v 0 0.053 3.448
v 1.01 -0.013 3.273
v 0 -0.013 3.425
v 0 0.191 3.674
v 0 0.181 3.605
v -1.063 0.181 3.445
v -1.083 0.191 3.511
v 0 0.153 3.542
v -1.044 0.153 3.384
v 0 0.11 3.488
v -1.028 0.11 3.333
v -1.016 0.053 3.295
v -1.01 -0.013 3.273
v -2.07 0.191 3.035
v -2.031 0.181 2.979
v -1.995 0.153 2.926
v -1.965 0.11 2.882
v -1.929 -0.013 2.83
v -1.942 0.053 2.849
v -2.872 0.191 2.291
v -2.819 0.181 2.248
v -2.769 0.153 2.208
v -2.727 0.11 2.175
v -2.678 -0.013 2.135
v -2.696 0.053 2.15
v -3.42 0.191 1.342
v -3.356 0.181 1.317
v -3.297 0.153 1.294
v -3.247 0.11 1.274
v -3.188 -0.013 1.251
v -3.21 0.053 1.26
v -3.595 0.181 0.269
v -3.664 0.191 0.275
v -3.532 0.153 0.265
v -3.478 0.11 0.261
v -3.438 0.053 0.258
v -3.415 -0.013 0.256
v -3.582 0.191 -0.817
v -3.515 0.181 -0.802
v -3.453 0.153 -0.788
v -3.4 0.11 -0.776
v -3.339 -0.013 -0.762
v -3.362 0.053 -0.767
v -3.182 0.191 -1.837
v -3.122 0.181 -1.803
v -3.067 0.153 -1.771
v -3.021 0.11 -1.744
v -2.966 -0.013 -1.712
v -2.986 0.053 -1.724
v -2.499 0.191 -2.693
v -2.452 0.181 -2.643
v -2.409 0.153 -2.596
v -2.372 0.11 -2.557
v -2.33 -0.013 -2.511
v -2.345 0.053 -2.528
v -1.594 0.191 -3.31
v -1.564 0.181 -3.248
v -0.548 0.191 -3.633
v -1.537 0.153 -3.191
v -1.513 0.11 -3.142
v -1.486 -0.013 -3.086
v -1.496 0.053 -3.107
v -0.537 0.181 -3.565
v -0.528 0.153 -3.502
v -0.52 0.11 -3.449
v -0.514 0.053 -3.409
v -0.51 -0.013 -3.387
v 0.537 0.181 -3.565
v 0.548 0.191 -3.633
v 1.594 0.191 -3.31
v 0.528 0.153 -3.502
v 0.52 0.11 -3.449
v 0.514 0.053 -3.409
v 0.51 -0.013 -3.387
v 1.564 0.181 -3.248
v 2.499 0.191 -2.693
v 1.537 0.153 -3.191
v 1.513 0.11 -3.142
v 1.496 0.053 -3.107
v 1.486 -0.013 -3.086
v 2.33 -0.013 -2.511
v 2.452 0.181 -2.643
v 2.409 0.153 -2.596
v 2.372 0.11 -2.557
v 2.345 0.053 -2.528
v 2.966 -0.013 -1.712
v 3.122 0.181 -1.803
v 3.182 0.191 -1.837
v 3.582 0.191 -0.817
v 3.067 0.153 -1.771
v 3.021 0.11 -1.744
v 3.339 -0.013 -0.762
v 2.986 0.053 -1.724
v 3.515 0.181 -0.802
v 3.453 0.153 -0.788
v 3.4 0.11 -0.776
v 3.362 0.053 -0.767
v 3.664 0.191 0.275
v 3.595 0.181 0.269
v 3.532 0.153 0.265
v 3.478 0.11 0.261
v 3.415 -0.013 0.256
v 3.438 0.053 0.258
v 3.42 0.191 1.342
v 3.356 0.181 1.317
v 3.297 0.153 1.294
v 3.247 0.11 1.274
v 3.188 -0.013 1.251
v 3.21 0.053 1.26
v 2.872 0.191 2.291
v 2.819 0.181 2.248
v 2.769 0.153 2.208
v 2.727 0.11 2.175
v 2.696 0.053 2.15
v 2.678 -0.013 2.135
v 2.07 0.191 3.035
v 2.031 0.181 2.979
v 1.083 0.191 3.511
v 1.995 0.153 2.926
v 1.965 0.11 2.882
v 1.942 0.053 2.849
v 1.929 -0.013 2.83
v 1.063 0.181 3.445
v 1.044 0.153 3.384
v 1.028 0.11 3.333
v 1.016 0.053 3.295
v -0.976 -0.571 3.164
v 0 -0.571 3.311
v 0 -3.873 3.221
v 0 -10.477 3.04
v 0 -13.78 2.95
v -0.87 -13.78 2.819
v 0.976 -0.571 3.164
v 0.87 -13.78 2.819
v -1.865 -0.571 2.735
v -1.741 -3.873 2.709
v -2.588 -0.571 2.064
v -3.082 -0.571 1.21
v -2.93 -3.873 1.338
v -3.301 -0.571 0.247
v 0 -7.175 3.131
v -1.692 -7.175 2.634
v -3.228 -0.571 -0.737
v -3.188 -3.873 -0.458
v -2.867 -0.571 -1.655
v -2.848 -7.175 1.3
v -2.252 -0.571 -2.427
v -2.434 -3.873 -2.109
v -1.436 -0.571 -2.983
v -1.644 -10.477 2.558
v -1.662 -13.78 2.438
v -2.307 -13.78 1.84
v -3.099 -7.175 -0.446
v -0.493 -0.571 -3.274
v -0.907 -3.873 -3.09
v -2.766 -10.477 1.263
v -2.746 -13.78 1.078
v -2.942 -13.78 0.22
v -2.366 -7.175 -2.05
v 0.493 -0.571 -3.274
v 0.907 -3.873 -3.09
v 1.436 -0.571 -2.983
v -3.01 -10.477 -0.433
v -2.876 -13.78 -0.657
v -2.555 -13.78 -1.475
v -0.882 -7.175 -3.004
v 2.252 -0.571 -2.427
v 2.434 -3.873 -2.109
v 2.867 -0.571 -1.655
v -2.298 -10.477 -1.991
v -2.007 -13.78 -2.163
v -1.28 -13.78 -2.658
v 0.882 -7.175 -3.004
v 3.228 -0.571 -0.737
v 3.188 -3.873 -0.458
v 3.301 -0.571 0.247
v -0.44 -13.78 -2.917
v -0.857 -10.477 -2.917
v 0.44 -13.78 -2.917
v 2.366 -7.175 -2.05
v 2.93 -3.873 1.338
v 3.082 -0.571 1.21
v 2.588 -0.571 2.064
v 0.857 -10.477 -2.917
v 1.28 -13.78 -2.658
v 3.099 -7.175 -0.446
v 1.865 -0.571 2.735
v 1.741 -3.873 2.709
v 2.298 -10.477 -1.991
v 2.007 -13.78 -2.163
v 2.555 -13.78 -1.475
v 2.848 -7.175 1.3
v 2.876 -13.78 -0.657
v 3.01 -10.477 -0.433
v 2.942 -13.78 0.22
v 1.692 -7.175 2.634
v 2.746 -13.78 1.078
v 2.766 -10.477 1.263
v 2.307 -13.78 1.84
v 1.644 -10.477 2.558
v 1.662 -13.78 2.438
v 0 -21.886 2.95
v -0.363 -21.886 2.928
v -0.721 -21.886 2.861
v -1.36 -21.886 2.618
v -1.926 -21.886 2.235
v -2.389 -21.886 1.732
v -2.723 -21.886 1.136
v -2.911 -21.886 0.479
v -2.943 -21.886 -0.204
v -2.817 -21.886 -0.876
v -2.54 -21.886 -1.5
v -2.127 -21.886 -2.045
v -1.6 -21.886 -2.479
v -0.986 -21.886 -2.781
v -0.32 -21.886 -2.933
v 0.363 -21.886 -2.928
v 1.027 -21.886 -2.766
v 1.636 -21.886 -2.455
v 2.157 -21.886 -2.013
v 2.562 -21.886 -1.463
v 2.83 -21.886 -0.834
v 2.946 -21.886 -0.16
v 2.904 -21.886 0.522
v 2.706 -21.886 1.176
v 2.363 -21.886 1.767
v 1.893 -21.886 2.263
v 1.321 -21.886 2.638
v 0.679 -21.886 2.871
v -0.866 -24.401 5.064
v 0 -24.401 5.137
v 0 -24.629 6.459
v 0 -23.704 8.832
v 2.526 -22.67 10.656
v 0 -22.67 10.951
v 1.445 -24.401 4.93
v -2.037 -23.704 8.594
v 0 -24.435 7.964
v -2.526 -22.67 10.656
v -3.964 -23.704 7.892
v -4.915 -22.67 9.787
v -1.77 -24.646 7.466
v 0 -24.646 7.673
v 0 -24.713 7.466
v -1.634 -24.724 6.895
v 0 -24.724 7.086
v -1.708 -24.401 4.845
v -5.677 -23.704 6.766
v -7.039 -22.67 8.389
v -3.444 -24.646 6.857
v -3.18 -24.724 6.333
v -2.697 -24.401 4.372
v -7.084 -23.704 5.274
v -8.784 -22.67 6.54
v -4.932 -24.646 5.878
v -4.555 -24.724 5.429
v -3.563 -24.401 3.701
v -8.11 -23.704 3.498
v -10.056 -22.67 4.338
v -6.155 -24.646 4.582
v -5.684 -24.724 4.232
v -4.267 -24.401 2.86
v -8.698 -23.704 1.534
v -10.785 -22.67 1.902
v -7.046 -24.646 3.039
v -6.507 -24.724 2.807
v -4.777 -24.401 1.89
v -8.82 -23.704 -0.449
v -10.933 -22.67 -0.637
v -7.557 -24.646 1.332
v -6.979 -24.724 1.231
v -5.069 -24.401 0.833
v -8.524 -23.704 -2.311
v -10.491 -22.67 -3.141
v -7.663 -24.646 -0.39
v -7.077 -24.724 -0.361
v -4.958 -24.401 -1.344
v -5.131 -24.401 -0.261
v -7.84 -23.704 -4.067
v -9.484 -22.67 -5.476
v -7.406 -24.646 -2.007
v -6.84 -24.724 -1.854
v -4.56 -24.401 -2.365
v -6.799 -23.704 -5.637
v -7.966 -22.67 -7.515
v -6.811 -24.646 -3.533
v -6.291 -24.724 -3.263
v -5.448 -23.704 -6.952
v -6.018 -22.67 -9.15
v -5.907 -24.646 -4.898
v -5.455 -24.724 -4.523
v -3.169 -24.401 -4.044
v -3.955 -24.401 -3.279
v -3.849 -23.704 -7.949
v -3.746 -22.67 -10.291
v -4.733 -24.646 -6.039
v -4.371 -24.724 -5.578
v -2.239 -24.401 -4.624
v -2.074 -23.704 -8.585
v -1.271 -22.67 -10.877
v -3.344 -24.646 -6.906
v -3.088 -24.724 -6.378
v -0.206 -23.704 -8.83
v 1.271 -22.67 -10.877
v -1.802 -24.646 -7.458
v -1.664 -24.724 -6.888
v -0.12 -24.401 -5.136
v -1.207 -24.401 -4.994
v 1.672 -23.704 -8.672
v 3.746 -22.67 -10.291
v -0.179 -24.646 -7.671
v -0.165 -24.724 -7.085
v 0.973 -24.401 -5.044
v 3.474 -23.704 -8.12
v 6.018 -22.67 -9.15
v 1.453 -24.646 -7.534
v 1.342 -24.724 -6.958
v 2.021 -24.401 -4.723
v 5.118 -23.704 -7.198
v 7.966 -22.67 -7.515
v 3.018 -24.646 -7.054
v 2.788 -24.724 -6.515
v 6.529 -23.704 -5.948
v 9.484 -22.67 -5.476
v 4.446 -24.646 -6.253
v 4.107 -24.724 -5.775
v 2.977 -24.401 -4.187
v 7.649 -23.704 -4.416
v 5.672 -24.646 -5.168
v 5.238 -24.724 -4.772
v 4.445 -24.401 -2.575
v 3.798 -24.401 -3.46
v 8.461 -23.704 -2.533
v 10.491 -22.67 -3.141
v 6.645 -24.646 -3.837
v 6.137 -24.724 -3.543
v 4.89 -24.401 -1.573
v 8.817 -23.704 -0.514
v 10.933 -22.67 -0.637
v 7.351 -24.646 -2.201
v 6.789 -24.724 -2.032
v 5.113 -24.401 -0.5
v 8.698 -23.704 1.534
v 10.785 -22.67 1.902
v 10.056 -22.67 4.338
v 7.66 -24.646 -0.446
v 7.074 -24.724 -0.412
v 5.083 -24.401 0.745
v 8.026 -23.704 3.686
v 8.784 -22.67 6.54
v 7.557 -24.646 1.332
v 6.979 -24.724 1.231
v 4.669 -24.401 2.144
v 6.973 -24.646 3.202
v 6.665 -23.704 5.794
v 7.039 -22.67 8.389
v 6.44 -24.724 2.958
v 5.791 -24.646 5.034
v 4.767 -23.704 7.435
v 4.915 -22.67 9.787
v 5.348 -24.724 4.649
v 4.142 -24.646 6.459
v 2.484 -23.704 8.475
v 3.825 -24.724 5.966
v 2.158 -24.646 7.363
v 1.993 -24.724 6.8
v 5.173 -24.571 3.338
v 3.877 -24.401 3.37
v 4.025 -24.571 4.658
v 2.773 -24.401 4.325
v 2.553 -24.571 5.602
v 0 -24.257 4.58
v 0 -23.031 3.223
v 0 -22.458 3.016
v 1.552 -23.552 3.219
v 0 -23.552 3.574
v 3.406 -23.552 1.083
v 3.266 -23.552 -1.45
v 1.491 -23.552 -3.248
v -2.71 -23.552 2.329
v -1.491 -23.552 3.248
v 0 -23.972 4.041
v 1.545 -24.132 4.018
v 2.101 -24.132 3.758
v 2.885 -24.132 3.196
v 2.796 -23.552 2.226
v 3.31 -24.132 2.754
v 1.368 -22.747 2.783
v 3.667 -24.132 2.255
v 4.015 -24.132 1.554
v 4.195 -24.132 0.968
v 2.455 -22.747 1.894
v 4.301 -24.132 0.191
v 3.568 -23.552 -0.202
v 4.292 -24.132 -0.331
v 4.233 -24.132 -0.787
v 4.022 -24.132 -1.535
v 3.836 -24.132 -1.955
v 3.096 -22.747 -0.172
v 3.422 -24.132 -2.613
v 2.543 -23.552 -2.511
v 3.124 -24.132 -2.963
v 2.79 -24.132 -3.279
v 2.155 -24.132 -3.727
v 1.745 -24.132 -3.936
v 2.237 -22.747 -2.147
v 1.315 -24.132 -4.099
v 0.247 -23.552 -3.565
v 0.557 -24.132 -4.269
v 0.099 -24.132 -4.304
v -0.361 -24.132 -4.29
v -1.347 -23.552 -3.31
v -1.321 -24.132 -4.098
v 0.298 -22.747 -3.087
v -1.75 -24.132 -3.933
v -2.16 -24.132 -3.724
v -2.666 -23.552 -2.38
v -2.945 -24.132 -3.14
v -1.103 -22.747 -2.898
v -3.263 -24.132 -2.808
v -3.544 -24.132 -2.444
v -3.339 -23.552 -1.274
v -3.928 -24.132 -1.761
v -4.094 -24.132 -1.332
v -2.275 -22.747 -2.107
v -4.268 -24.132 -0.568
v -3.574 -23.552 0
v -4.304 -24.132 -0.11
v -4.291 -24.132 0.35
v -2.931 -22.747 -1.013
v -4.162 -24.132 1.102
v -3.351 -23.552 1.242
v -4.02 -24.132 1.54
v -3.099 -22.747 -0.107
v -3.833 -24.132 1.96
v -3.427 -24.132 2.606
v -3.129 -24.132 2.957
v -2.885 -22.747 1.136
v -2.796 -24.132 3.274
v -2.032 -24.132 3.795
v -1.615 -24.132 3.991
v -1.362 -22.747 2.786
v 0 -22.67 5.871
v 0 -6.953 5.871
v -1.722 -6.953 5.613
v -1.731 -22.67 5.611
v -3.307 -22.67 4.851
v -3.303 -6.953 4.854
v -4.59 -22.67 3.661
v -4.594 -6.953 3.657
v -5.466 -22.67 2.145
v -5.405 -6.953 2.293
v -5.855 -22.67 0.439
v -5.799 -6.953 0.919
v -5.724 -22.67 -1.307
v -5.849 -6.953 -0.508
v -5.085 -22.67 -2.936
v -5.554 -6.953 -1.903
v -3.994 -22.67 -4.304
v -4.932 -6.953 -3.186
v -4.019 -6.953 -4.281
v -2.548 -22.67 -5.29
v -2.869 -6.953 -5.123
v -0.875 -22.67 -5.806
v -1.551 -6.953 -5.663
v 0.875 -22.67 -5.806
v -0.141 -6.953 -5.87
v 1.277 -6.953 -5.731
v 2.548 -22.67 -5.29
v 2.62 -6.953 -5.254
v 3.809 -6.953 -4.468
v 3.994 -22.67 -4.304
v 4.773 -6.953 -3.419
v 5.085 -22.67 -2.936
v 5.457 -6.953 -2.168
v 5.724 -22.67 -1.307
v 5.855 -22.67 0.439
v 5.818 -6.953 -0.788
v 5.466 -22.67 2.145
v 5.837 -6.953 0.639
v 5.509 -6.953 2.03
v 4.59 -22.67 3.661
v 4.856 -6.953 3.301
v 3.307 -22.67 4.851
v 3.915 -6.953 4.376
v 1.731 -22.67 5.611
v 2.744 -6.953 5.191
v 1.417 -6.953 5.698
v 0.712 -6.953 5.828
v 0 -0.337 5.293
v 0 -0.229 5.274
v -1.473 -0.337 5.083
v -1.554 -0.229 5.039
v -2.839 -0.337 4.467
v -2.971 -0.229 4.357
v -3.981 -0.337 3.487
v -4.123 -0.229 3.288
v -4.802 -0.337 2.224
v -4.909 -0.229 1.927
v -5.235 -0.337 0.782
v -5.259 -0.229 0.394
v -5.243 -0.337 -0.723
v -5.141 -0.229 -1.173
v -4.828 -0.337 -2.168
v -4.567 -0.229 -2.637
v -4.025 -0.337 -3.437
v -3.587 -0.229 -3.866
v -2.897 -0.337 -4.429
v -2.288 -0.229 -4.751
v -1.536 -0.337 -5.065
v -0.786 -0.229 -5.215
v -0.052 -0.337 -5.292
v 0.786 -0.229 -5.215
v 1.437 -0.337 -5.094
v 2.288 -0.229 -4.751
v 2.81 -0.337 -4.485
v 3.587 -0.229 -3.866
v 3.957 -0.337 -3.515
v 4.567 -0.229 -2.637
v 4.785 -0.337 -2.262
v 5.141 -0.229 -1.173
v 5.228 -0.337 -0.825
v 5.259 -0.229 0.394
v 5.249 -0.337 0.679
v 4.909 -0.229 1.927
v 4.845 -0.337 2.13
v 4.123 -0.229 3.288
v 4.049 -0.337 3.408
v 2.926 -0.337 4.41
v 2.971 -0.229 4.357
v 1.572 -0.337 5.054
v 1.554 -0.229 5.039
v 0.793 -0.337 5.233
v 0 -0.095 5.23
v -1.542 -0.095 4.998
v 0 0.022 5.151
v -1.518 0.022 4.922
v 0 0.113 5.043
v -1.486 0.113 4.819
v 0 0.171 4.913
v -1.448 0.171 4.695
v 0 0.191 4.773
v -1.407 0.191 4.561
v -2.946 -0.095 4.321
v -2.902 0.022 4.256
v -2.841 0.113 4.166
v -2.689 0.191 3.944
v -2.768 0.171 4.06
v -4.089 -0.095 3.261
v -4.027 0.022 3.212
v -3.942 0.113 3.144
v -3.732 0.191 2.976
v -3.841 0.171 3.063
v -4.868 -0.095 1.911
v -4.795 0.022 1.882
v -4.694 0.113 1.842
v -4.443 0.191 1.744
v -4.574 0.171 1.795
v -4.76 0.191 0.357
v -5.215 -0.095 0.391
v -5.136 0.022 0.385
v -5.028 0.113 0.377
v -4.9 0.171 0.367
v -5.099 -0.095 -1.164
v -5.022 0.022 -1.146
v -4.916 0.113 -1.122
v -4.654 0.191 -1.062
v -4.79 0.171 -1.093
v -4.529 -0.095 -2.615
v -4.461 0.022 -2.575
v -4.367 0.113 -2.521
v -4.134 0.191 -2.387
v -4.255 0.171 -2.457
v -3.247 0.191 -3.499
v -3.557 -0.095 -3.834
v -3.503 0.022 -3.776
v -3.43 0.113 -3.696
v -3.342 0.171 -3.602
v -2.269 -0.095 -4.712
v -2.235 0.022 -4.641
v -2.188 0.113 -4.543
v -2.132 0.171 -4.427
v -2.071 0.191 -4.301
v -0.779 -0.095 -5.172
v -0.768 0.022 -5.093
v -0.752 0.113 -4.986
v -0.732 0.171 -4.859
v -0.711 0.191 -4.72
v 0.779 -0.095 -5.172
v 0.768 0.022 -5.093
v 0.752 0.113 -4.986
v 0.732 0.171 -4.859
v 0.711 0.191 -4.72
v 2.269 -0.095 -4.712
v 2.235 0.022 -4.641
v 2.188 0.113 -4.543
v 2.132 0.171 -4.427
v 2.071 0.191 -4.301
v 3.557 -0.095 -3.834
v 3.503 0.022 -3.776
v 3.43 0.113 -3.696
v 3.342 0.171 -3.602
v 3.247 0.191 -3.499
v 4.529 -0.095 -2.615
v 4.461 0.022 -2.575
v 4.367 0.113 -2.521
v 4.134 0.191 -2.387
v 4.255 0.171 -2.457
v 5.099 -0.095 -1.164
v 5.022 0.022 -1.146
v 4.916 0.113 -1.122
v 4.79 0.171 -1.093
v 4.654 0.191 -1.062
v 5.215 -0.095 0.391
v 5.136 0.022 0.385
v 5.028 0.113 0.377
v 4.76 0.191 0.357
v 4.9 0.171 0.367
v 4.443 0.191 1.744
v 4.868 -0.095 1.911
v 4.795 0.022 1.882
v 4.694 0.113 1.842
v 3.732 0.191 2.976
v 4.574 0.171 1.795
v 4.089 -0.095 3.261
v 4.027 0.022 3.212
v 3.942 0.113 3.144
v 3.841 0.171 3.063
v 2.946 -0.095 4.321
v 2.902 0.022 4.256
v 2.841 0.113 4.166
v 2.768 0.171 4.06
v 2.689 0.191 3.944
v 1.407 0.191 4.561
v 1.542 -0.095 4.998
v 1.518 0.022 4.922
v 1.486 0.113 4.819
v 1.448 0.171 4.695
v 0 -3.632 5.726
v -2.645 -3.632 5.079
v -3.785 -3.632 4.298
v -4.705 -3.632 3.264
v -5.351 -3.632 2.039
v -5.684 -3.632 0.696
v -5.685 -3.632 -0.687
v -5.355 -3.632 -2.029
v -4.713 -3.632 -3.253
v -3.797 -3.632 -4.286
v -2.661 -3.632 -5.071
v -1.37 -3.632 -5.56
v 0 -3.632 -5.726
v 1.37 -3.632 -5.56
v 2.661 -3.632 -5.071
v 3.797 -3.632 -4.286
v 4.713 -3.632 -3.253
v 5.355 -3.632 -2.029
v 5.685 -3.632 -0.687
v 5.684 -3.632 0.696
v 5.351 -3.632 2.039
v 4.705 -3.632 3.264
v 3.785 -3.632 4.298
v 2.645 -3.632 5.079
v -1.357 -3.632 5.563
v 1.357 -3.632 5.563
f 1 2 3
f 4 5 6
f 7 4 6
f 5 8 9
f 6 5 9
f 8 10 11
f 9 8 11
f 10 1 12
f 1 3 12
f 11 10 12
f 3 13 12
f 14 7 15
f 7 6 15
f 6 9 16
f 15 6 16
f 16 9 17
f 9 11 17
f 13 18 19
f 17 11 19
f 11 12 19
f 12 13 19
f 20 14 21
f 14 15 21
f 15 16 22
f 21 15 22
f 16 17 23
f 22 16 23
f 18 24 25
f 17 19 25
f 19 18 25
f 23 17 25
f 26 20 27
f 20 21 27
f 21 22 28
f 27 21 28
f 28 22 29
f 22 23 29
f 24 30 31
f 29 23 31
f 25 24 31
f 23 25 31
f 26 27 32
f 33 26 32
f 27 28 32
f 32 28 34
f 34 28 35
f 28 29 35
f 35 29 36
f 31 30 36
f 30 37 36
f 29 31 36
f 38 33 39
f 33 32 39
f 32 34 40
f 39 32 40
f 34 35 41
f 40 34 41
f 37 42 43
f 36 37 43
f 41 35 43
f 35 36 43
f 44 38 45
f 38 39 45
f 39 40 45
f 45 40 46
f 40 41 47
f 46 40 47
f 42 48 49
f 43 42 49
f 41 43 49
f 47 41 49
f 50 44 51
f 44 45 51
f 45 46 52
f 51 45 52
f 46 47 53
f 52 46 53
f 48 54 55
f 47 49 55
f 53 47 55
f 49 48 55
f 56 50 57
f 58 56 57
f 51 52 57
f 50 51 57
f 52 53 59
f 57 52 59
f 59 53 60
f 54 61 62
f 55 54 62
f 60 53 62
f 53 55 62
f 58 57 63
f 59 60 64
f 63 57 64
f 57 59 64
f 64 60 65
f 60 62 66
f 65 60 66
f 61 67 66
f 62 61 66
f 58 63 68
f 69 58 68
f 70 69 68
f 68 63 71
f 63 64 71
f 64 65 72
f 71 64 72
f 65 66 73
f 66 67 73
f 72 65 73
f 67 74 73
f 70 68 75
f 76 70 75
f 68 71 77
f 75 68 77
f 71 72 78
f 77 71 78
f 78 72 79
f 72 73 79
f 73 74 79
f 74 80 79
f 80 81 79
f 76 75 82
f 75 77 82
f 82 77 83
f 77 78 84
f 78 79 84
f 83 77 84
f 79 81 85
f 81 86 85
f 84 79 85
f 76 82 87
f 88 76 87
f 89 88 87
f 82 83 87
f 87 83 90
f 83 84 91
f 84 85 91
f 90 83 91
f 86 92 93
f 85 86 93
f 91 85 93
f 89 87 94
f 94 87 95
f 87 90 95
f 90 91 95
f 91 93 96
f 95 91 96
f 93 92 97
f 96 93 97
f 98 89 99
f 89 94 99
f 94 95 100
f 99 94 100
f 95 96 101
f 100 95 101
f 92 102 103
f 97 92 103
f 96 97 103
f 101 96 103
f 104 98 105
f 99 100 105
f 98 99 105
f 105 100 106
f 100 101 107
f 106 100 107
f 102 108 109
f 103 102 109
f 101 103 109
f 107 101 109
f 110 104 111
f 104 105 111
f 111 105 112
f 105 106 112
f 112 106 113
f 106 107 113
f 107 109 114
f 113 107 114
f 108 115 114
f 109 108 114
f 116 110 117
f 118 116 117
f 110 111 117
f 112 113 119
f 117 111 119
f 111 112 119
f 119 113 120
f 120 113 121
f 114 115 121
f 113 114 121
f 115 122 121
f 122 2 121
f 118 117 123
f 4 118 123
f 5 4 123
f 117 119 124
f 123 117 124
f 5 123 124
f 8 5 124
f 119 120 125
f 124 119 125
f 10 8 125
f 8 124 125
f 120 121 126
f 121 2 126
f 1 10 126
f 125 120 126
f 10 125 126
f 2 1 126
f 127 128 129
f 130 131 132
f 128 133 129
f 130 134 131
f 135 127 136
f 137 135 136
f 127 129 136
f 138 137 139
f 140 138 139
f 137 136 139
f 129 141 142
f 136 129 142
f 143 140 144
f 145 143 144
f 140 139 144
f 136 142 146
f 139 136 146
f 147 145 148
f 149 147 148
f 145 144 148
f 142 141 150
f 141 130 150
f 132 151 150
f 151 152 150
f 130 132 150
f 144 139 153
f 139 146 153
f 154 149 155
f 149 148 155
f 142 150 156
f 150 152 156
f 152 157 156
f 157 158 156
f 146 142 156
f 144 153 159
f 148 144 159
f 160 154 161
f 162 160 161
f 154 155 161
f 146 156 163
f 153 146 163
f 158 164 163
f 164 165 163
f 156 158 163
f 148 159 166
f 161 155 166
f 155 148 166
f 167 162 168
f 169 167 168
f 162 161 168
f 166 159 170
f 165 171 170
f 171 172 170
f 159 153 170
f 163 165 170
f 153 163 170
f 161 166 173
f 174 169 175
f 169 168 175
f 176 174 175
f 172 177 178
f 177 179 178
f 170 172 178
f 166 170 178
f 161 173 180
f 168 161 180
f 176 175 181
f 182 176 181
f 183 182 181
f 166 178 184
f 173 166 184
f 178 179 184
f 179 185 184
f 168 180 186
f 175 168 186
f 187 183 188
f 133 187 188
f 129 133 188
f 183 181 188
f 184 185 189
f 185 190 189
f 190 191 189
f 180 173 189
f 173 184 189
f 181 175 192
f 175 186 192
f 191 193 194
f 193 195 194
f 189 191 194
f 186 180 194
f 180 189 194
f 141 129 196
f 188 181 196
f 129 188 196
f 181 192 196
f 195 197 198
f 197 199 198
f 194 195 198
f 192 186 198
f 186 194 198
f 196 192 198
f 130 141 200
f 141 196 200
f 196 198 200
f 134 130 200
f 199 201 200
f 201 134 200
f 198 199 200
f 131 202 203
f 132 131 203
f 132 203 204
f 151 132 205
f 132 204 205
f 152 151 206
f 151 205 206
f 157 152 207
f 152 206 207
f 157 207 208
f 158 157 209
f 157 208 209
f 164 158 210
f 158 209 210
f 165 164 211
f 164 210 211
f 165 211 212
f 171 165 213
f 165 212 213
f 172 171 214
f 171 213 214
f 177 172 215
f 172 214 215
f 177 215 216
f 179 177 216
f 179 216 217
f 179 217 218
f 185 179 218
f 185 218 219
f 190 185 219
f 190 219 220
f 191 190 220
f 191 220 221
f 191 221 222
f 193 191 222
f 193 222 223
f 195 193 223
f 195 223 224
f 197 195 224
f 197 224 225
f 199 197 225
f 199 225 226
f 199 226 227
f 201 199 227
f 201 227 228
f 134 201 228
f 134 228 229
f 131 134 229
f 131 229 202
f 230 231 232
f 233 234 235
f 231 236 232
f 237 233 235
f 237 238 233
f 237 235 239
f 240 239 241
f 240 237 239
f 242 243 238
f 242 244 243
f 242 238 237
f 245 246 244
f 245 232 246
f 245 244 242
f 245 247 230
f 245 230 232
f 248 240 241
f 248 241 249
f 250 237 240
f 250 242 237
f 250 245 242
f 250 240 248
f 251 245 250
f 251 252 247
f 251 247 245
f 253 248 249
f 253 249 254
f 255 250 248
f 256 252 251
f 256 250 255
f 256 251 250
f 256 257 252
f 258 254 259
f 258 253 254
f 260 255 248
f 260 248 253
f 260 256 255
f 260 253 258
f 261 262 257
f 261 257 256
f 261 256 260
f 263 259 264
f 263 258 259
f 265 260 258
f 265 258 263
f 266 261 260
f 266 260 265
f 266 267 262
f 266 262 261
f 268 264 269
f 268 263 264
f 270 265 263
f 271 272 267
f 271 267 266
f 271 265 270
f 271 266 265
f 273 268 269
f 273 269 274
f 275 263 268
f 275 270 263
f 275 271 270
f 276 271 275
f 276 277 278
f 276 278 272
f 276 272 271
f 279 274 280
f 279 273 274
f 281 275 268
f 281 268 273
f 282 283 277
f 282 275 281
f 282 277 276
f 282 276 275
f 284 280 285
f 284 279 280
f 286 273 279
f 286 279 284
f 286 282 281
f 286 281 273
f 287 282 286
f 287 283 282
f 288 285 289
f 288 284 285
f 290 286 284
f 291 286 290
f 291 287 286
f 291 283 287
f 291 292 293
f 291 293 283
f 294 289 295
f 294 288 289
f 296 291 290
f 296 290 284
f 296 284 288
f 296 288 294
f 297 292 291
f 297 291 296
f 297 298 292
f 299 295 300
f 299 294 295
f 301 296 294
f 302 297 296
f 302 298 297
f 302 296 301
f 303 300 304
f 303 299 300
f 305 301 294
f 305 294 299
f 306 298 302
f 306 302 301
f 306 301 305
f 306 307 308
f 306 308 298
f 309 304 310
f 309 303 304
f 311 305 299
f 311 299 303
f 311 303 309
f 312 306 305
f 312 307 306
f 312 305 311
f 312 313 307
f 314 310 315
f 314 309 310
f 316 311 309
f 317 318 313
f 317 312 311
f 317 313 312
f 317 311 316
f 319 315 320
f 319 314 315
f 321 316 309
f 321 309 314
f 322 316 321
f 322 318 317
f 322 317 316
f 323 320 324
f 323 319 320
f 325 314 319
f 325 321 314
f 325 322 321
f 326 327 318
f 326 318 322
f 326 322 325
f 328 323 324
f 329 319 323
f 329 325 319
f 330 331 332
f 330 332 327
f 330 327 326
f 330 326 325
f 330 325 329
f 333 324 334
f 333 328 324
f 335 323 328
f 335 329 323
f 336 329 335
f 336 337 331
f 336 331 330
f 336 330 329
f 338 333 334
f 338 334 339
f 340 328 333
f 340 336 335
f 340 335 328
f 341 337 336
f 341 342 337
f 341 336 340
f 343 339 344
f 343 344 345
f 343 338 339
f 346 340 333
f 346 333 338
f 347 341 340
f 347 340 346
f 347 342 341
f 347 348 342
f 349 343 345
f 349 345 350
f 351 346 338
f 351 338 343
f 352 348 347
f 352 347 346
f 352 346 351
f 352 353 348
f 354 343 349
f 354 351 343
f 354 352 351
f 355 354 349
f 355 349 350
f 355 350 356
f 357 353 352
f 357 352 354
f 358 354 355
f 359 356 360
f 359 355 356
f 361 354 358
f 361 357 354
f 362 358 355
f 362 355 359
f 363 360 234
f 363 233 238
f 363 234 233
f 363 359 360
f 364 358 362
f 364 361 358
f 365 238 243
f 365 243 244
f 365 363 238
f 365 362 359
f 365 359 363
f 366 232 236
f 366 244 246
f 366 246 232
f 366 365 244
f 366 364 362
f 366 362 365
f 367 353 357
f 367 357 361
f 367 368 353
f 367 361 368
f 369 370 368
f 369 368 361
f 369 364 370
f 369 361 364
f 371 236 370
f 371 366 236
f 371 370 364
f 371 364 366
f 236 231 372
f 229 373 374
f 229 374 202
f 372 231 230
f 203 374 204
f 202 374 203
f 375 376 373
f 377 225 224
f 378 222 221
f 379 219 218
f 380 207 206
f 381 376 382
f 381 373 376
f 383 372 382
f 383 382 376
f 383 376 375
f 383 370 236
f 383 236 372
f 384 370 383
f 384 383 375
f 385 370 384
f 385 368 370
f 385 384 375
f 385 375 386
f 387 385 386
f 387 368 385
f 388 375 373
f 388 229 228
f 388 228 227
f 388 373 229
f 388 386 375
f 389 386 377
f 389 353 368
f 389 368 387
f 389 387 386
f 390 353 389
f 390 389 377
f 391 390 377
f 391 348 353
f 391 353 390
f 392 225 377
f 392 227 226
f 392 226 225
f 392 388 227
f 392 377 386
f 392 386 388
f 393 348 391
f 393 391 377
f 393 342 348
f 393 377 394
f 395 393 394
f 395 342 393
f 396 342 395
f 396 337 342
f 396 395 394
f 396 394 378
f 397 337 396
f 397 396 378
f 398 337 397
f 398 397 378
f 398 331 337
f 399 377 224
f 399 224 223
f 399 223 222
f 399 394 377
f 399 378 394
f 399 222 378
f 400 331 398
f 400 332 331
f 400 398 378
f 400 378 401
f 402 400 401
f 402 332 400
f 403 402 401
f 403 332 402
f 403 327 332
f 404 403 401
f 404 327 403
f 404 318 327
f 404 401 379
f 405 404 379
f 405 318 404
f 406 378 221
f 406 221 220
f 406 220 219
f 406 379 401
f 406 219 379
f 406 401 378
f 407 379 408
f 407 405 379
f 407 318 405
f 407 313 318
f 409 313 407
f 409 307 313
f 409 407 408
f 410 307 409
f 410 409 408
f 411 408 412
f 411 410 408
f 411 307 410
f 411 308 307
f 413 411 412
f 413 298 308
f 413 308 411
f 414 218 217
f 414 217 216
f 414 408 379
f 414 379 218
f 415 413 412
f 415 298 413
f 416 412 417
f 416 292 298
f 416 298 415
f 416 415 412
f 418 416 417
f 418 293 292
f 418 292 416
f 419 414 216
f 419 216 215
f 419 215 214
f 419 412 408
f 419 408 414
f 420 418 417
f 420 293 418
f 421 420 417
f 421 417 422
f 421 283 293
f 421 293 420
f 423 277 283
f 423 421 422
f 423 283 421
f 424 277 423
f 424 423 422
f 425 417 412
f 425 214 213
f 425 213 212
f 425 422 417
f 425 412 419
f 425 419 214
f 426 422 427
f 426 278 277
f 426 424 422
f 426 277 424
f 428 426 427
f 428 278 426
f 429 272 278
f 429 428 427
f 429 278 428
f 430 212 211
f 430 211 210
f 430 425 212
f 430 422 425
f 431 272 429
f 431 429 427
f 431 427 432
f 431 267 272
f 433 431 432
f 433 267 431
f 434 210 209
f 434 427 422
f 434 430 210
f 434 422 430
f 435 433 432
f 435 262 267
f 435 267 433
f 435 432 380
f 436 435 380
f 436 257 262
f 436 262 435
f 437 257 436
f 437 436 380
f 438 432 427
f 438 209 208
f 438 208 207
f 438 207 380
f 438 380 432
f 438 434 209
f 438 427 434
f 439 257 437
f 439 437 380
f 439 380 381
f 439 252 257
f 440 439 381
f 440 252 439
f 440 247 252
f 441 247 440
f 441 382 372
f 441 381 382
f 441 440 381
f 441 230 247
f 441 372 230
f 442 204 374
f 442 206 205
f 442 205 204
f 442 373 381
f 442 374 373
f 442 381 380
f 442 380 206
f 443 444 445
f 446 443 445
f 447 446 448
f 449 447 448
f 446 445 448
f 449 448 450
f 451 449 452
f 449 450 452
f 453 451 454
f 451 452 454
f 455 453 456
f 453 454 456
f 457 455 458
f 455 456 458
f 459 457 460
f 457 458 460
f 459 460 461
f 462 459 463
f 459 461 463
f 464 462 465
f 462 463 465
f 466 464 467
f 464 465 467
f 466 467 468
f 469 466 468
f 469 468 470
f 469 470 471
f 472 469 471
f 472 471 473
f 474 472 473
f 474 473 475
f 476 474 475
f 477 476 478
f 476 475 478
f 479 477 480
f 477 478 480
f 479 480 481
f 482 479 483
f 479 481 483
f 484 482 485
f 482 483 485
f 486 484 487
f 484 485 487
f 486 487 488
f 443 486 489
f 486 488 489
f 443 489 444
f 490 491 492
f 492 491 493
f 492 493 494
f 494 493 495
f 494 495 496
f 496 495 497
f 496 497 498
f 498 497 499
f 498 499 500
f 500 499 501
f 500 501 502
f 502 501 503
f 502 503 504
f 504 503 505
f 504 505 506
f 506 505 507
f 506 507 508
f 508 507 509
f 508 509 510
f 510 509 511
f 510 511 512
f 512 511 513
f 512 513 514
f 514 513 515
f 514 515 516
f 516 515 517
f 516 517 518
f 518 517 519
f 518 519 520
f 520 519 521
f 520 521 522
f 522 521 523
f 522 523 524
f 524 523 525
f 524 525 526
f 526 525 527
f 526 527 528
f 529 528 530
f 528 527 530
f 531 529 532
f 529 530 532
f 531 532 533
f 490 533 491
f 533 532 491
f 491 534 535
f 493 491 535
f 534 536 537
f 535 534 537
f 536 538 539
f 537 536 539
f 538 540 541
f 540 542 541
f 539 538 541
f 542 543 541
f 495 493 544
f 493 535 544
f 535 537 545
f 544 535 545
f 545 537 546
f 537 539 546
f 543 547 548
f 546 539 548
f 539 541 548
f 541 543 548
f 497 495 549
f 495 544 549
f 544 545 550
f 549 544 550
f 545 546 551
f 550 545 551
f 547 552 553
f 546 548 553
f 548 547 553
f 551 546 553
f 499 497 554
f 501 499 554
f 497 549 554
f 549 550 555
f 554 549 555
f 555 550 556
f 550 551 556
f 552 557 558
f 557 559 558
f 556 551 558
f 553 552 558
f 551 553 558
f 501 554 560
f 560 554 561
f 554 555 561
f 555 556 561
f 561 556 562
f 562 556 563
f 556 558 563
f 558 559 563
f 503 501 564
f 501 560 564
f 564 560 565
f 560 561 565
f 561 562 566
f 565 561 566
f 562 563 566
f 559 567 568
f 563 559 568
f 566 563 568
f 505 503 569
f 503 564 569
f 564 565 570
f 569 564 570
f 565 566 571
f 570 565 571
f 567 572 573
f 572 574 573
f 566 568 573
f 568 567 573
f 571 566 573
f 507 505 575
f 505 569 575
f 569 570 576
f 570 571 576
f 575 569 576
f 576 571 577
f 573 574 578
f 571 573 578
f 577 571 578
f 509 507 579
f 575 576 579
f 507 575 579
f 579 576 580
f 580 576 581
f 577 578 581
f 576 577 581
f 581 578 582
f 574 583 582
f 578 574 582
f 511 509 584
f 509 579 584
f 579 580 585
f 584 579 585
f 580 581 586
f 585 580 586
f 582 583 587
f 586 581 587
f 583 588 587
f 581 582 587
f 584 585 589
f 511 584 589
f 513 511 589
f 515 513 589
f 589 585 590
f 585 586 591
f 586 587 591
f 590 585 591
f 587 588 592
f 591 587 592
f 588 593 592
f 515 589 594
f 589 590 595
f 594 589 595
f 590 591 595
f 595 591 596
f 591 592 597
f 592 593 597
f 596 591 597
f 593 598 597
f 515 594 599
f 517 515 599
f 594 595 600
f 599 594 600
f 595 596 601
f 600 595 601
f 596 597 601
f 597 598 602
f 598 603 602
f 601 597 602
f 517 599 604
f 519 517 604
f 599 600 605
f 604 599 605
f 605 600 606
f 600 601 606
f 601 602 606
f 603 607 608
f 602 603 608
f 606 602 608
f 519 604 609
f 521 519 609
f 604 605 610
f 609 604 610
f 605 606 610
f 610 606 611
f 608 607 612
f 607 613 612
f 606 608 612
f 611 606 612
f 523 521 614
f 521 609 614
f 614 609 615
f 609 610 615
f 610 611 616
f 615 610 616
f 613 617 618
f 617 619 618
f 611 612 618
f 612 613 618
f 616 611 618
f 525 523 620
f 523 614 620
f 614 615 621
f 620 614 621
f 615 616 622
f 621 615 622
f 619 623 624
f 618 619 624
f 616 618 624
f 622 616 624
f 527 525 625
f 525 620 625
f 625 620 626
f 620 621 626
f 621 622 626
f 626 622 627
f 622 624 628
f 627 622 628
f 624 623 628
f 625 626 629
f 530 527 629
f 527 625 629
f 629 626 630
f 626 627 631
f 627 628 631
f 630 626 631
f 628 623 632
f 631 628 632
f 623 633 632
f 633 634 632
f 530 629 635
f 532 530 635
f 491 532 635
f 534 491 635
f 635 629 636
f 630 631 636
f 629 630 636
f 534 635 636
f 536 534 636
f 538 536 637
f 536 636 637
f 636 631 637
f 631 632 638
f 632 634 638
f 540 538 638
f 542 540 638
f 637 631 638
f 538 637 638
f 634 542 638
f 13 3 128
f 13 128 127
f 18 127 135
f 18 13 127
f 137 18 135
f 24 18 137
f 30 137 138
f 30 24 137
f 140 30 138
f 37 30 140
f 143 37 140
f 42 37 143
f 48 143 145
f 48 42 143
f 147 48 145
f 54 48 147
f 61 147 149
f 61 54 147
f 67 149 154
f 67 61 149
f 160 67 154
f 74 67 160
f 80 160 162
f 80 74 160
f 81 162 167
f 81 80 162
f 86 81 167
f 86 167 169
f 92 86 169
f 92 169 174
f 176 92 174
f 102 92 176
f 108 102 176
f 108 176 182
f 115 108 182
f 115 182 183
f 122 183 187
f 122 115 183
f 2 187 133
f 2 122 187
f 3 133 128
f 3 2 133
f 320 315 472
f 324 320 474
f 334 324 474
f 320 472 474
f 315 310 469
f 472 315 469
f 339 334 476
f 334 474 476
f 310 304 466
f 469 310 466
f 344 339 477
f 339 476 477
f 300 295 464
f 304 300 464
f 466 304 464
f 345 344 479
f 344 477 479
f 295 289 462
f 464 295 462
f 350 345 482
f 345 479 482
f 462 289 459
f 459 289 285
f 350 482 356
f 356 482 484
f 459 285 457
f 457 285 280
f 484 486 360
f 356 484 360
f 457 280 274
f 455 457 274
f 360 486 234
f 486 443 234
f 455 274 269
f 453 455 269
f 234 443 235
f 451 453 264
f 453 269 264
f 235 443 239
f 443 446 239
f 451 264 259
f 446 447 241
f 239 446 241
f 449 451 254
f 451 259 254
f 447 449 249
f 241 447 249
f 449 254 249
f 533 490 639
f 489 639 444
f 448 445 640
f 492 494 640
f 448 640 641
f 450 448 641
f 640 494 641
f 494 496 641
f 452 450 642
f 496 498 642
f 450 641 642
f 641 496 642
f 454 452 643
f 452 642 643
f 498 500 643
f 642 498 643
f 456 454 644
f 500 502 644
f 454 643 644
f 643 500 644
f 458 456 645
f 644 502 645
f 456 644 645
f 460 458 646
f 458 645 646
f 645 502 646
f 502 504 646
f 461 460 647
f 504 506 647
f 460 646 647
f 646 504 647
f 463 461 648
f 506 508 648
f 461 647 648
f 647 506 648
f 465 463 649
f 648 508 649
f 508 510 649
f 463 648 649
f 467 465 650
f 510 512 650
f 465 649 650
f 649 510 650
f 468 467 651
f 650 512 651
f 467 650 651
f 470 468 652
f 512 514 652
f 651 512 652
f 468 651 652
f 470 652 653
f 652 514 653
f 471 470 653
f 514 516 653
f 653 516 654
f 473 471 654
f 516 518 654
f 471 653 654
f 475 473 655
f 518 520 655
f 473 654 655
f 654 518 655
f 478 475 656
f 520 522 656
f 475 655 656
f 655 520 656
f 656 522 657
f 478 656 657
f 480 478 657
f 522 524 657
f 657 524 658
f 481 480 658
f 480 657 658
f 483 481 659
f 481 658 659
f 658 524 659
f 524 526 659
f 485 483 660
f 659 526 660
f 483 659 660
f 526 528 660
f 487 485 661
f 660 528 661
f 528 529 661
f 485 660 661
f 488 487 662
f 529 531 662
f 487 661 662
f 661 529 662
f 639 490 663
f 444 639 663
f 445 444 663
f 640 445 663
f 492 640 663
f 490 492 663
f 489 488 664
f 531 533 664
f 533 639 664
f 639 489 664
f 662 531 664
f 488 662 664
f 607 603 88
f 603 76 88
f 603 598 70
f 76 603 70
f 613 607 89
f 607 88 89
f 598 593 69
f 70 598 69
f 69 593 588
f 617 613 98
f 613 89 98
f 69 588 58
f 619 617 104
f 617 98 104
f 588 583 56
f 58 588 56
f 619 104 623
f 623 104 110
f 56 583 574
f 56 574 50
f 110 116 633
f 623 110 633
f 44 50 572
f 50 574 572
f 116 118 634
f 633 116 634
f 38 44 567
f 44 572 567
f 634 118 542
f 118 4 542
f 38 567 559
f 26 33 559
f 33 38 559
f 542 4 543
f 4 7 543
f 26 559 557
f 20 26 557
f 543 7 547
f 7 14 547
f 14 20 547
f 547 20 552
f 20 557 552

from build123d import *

# Parameters (mm, degrees)
CHAMFER1_SIZE      = 3.81
CHAMFER1_SIZE2     = 0.671805796
FILLET2_R          = 0.508
FILLET3_R          = 38.1
CHAMFER2_SIZE      = 0.762
CHAMFER2_SIZE2     = 0.135060614
FILLET4_R          = 0.254
SKETCH6_R          = 2.950428165
CUT_EXTRUDE1_DEPTH = 28.612445783
FILLET5_R          = 2.54


with BuildPart() as part:
    # Sketch3 → Revolve1 (revolve)
    with BuildSketch(Plane(origin=(0, 0, 0), x_dir=(0, 0, -1), z_dir=(1, 0, 0))):
        with BuildLine():
            Line((-3.331428165, 0.1905), (-2.950428165, -13.7795))
            Line((-2.950428165, -13.7795), (-2.950428165, -22.6695))
            Line((-2.950428165, -22.6695), (0, -22.6695))
            Line((0, -22.6695), (0, -24.1935))
            add(Edge.make_bspline(
                [(-10.951428165, -22.6695), (-7.67361224, -23.87858079), (-8.424695912, -25.057739032), (-3.760861411, -24.039674634), (-1.096246091, -24.1935), (0, -24.1935)],
                knots=[0, 0, 0, 0, 0.345230168, 0.440287605, 1, 1, 1, 1], degree=3))
            Line((-10.951428165, -22.6695), (-5.871428165, -22.6695))
            Line((-5.871428165, -22.6695), (-5.871428165, 0.1905))
            Line((-5.871428165, 0.1905), (-3.331428165, 0.1905))
        make_face()
    revolve(axis=Axis((0, -22.6695, 0), (0, -1, 0)))

    # Chamfer1
    chamfer1_edges = [part.edges().sort_by_distance(p)[0] for p in [
        (0, 0.1905, -5.871428165),
    ]]
    chamfer1_side = [part.faces().sort_by_distance(p)[0] for p in [
        (0, -11.2395, -5.871428165),
    ]]
    chamfer(chamfer1_edges, length=CHAMFER1_SIZE, length2=CHAMFER1_SIZE2, reference=chamfer1_side[0])

    # Fillet2
    fillet2_edges = [part.edges().sort_by_distance(p)[0] for p in [
        (0, 0.1905, -5.199622369),
    ]]
    fillet(fillet2_edges, radius=FILLET2_R)

    # Fillet3
    fillet3_edges = [part.edges().sort_by_distance(p)[0] for p in [
        (0, -3.6195, -5.871428165),
    ]]
    fillet(fillet3_edges, radius=FILLET3_R)

    # Chamfer2
    chamfer2_edges = [part.edges().sort_by_distance(p)[0] for p in [
        (0, 0.1905, -3.331428165),
    ]]
    chamfer2_side = [part.faces().sort_by_distance(p)[0] for p in [
        (0, -6.7945, -3.140928165),
    ]]
    chamfer(chamfer2_edges, length=CHAMFER2_SIZE, length2=CHAMFER2_SIZE2, reference=chamfer2_side[0])

    # Fillet4
    fillet4_edges = [part.edges().sort_by_distance(p)[0] for p in [
        (0, 0.1905, -3.46648878),
    ]]
    fillet(fillet4_edges, radius=FILLET4_R)

    # Sketch6 → Cut-Extrude1 (cut, through all)
    with BuildSketch(Plane(origin=(0, -22.6695, 0), x_dir=(1, 0, 0), z_dir=(0, 1, 0))):
        with Locations(Location((0, 0, 0), (0, 0, 270))):
            Circle(SKETCH6_R)
    extrude(amount=-CUT_EXTRUDE1_DEPTH, mode=Mode.SUBTRACT)

    # Fillet5
    fillet5_edges = [part.edges().sort_by_distance(p)[0] for p in [
        (2e-09, -24.204539733, -2.950428166),
    ]]
    fillet(fillet5_edges, radius=FILLET5_R)


solid = part.part
